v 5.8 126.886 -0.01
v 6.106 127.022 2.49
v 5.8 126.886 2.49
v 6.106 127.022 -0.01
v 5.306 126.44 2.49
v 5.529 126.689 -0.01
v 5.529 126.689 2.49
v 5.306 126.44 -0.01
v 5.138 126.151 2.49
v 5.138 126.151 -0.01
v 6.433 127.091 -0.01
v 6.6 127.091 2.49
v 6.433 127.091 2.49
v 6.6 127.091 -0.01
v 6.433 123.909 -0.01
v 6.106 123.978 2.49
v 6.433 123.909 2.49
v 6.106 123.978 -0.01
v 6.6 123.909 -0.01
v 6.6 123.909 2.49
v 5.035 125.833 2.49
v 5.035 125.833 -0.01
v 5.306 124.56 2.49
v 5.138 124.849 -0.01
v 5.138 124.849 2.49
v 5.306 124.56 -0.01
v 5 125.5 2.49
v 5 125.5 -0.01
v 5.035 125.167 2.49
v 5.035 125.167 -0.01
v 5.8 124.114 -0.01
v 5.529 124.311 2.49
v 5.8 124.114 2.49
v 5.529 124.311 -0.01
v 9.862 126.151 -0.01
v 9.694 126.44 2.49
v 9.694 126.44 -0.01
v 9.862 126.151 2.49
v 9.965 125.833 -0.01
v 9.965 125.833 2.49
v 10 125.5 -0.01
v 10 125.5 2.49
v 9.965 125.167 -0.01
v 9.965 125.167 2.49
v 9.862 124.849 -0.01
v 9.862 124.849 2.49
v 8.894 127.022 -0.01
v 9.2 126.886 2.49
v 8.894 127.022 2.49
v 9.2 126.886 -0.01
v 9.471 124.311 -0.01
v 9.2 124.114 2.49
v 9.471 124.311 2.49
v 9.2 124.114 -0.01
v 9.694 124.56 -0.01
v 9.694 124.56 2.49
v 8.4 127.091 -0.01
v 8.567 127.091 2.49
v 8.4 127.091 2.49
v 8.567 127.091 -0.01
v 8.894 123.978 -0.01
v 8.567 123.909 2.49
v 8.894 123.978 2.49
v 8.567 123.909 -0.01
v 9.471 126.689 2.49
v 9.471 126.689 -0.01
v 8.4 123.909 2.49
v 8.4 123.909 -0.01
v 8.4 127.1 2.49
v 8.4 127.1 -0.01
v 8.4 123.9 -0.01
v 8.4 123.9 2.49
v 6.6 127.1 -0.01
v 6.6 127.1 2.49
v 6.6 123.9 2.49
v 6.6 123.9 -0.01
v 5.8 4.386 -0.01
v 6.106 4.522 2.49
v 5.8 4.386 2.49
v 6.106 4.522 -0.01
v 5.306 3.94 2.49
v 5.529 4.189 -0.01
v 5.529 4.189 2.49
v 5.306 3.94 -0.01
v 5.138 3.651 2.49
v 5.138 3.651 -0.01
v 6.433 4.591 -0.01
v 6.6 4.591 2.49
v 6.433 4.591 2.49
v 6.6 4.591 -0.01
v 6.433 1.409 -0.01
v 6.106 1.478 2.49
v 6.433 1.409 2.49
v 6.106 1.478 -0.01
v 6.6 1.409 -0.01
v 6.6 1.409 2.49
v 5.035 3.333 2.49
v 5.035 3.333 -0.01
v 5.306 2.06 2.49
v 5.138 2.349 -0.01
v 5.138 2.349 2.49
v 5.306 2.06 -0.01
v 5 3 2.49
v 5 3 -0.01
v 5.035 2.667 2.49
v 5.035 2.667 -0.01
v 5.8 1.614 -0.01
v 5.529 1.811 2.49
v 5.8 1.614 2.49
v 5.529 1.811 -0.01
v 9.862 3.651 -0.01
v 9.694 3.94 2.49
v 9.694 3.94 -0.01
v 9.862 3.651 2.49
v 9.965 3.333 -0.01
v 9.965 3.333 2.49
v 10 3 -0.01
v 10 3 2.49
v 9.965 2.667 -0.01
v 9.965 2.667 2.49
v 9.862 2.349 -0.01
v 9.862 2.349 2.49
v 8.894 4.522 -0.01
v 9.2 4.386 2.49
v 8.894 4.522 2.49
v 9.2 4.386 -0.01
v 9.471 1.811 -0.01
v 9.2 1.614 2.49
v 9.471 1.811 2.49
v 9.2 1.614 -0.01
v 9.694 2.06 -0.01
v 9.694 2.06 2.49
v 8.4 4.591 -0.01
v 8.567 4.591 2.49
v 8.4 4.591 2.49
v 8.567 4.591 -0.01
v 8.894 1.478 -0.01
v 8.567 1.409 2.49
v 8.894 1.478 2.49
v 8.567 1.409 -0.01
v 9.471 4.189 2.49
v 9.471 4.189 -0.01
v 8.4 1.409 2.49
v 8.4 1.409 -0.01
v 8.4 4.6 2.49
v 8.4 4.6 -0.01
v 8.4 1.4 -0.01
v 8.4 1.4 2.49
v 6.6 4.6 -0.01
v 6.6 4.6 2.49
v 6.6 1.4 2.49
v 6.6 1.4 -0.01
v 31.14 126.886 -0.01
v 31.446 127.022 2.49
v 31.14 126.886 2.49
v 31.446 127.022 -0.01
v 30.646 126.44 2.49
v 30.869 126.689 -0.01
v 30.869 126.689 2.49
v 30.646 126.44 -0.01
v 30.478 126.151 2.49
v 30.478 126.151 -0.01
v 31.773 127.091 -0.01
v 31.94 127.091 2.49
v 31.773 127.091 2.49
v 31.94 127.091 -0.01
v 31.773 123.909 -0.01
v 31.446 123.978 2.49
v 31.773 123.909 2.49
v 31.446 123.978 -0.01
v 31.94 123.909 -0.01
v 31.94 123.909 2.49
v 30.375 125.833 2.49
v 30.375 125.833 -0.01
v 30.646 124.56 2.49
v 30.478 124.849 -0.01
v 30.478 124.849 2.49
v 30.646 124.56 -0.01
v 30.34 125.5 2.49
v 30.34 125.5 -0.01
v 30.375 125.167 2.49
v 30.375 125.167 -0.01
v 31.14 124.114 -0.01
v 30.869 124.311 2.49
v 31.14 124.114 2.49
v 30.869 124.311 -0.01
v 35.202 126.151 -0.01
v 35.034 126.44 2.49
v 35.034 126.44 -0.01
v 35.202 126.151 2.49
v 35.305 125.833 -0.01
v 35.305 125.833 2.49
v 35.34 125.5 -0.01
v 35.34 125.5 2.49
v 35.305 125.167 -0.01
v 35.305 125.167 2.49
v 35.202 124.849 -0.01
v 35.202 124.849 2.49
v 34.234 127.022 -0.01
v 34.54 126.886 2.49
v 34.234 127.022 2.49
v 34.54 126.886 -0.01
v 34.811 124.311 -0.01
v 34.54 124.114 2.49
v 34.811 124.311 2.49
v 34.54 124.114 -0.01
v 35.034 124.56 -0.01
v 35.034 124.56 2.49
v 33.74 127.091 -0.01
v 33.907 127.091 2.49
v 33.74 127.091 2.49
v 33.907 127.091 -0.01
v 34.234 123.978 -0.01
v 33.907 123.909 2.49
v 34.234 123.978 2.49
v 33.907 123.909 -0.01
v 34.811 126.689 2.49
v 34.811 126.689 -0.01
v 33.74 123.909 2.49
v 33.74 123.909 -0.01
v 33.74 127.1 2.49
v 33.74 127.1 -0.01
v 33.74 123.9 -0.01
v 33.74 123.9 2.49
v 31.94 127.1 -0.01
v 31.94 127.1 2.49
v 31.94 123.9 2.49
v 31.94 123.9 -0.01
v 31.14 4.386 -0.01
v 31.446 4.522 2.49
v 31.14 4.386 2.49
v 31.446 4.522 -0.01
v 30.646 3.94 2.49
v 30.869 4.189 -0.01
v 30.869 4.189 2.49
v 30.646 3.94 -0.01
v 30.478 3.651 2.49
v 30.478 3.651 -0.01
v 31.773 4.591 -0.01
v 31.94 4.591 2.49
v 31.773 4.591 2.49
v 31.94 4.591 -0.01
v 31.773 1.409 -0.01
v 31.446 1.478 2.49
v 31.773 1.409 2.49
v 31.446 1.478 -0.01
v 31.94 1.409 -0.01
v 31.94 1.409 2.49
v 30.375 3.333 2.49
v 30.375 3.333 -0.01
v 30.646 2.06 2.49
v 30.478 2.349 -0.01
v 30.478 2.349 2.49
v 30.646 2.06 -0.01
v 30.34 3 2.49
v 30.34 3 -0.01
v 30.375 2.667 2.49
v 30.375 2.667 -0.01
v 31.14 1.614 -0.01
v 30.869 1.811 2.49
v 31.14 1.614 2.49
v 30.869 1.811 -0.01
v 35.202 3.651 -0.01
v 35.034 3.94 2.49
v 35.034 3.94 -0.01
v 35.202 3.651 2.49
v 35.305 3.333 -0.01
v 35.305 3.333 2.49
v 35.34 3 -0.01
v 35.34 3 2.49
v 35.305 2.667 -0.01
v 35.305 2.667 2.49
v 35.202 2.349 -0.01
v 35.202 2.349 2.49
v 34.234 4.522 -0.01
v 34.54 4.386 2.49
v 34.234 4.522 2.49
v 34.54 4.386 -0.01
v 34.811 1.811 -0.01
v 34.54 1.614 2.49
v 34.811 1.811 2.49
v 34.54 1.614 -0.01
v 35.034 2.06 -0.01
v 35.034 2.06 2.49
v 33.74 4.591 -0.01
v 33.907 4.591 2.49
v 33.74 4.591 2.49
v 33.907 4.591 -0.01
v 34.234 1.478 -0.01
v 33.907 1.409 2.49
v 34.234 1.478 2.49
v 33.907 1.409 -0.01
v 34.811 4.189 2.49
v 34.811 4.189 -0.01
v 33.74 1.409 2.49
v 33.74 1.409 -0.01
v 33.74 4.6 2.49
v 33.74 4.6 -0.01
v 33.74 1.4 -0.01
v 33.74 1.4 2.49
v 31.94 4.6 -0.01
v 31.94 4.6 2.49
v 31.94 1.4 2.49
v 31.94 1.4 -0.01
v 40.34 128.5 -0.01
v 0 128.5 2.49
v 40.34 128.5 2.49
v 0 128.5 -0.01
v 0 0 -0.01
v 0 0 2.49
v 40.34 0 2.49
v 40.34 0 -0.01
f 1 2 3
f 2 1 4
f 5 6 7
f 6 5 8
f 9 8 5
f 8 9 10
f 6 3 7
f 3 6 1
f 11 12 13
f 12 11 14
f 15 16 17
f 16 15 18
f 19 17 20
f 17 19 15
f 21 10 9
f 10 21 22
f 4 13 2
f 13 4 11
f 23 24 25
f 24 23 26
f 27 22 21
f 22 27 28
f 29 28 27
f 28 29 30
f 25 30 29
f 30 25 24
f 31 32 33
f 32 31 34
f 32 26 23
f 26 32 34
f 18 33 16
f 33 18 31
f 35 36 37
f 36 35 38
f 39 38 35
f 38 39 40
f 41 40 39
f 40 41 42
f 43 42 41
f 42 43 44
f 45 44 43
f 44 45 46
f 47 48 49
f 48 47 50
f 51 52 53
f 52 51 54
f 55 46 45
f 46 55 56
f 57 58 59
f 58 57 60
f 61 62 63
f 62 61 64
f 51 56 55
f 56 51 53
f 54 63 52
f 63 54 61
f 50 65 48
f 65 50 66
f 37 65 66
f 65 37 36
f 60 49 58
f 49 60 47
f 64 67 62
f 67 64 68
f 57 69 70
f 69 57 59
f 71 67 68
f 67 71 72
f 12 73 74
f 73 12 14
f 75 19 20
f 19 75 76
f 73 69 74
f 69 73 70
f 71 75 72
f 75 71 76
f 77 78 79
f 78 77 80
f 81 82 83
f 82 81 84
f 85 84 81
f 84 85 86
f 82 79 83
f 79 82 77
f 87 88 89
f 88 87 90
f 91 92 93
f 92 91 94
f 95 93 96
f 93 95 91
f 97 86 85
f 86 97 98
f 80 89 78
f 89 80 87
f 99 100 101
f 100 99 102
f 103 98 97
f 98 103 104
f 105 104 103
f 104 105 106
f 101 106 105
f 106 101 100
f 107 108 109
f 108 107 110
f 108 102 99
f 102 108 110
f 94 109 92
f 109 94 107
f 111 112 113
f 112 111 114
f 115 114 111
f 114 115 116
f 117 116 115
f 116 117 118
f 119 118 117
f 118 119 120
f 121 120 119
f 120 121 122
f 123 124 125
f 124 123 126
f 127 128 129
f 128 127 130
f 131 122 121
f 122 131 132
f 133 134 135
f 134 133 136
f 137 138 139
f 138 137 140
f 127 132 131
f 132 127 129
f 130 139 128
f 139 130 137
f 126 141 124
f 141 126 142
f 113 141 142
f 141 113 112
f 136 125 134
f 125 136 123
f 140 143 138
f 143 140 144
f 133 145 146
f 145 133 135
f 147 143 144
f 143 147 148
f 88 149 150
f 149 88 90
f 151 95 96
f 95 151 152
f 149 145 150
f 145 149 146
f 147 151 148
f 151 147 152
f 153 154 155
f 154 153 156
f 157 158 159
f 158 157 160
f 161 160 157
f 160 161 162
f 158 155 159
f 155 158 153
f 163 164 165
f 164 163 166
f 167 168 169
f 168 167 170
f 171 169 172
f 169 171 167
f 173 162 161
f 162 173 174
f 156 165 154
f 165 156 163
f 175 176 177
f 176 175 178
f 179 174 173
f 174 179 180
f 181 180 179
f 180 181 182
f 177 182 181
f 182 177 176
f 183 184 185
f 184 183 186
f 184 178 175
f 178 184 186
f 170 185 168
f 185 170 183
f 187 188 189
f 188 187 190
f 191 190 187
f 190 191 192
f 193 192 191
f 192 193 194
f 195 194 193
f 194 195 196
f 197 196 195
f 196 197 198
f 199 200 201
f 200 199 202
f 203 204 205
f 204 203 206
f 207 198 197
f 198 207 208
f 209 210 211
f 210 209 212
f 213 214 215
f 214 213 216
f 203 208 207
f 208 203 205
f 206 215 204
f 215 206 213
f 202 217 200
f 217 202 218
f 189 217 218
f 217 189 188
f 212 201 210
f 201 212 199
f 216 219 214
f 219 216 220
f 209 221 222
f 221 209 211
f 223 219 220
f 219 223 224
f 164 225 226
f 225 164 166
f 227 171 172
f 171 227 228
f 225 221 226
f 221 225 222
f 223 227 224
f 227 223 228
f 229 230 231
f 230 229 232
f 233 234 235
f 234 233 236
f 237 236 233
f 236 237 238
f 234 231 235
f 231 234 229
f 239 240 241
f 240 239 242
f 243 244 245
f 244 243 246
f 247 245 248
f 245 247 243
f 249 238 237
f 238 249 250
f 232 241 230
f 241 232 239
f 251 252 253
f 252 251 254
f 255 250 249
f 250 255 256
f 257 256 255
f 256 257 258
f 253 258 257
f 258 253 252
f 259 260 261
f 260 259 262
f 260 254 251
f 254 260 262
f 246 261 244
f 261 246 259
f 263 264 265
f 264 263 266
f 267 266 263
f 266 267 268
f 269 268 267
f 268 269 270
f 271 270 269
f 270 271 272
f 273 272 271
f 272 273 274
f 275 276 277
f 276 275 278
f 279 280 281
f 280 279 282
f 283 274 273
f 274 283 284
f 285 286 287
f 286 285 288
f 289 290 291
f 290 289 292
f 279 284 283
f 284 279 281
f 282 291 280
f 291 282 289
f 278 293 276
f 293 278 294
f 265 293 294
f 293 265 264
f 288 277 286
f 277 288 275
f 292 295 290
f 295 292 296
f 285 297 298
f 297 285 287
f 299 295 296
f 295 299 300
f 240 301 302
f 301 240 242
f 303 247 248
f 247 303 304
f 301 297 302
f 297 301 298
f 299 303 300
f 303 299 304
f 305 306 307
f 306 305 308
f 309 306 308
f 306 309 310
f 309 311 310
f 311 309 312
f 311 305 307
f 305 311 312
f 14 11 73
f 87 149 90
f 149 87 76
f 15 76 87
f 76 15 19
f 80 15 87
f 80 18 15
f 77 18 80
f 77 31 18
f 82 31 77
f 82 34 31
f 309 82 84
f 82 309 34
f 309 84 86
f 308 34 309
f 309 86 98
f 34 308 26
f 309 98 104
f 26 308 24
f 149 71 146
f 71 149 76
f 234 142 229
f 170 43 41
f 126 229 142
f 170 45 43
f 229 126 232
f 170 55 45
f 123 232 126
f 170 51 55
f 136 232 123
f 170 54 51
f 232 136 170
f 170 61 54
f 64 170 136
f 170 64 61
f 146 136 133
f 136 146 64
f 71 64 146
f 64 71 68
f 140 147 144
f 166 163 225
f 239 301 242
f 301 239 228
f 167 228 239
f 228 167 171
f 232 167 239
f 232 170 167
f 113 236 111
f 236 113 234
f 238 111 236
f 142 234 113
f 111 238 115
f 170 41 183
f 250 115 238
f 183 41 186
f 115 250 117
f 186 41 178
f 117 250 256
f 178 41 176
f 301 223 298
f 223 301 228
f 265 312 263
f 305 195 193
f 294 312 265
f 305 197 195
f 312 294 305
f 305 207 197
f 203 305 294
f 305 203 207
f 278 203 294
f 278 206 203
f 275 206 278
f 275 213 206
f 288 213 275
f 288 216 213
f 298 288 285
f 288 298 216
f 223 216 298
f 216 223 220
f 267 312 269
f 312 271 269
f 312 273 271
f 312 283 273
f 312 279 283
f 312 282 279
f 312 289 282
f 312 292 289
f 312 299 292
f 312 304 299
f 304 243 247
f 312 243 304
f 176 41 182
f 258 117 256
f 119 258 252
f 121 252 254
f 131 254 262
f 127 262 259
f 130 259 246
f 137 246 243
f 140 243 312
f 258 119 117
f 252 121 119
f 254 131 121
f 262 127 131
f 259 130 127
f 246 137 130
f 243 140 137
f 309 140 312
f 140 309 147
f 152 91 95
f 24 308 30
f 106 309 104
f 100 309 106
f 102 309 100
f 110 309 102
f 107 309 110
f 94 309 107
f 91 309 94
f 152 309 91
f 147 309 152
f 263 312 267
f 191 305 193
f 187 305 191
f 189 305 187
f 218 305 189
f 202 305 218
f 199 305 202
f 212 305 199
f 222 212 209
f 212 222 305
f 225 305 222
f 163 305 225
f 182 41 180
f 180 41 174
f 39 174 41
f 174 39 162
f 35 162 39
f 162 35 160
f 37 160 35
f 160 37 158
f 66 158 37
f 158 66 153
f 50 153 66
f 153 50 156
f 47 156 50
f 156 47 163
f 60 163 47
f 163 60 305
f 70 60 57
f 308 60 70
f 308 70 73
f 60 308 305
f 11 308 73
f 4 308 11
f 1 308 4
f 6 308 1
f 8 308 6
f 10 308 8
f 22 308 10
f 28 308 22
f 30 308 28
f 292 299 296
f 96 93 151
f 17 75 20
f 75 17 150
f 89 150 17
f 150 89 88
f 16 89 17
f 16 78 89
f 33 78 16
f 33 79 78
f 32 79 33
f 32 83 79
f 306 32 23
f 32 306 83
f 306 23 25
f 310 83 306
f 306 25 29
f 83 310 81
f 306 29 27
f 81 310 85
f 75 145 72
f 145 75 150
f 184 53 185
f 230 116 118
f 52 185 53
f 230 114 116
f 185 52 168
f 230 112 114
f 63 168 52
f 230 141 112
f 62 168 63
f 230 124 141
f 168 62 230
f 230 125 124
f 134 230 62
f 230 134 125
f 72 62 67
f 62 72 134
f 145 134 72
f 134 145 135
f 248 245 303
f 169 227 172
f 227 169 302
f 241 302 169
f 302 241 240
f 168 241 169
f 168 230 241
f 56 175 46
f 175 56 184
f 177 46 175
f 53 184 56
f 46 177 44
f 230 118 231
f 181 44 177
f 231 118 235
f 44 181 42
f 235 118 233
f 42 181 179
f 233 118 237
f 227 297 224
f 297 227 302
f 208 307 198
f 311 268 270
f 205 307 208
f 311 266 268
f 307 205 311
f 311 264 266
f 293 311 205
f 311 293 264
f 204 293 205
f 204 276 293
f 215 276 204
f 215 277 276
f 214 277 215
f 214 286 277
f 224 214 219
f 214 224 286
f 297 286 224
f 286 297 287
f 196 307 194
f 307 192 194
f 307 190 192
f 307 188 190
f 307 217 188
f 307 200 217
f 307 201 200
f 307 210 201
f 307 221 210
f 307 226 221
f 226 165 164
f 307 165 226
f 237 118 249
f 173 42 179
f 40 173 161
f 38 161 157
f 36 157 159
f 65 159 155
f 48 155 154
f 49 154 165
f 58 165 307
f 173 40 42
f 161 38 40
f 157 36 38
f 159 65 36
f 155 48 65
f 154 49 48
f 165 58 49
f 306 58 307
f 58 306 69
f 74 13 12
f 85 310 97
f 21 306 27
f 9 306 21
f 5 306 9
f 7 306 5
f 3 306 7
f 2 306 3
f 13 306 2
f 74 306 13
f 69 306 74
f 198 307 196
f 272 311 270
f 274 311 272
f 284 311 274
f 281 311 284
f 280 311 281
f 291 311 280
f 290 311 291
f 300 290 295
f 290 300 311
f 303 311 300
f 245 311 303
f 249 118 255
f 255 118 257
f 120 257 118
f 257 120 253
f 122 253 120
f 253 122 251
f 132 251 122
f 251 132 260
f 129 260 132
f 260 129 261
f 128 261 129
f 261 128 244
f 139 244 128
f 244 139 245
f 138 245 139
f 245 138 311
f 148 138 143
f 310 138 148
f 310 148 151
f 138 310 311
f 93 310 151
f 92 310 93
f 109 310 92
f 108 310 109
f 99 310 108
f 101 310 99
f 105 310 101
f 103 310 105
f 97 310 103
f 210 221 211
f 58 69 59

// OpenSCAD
// file: panel_common.scad
thickness = 2;
panel_height = 128.5;
width_1hp = 5.08; // 5.08 == 0.2" (from the HP spec)
wiggle_room_width = 0.3; // so modules don't fit too tightly

hole_width = 5;
hole_diameter = 3.2;
hole_height_edge = 3; // distance from hole center to panel edge
hole_width_edge = 7.5; // distance from hole center to panel edge

// increase resolution of the cylinders
$fs = 0.1;

module face_plate(hp) {
  width = (width_1hp * hp) - wiggle_room_width;

  difference() {
    rotate([-90, 0, 0])
      translate([0, -thickness, 0])
        color("yellow")
        cube([width, thickness, panel_height]);
    mounting_holes(width);
  }
}

module hole_in_face_plate(diameter) {
  // The -0.5 and 1.0 ensure we're
  // cutting all the way through the panel
  translate([0, 0, -0.5])
    cylinder(d=diameter, h=thickness + 1.0);
}

module mounting_hole(diameter, width) {
  spacing = (width - diameter) / 2;
  union() {
    translate([-spacing, 0, 0])
      hole_in_face_plate(diameter);

    translate([spacing, 0, 0])
      hole_in_face_plate(diameter);

    // The -0.5 and 1.0 ensure we're
    // cutting all the way through the panel
    translate([-spacing, -diameter/2, -0.5])
      cube([width - diameter, diameter, thickness + 1.0]);
  }
}

module mounting_holes (panel_width) {
  // top left
  translate([hole_width_edge, panel_height - hole_height_edge, 0]) {
    mounting_hole(hole_diameter, hole_width);
  }

  // bottom left
  translate([hole_width_edge, hole_height_edge, 0]) {
    mounting_hole(hole_diameter, hole_width);
  }

  // top right
  translate([panel_width - hole_width_edge, panel_height - hole_height_edge, 0]) {
    mounting_hole(hole_diameter, hole_width);
  }

  // bottom right
  translate([panel_width - hole_width_edge, hole_height_edge, 0 ]) {
    mounting_hole(hole_diameter, hole_width);
  }
}
// main file
include <panel_common.scad>

hp = 8;
surface_thickness = 0.5;
width = (width_1hp * hp) - wiggle_room_width;

// to ensure faces aren't coincident
epsilon = 0.01;
difference() {
  union() {
    face_plate(hp);
    translate([0, 0, -epsilon])
      panel_surface();
  }
  mounting_holes(width);
}

module panel_surface() {
  difference() {
    rotate([-90, 0, 0])
      translate([0, -thickness-surface_thickness, 0])
        color("black")
        cube([width, thickness+surface_thickness, panel_height]);
  }
}

module hole (row, column, size) {
  translate([column, row, 0])
    hole_in_face_plate(size);
}
